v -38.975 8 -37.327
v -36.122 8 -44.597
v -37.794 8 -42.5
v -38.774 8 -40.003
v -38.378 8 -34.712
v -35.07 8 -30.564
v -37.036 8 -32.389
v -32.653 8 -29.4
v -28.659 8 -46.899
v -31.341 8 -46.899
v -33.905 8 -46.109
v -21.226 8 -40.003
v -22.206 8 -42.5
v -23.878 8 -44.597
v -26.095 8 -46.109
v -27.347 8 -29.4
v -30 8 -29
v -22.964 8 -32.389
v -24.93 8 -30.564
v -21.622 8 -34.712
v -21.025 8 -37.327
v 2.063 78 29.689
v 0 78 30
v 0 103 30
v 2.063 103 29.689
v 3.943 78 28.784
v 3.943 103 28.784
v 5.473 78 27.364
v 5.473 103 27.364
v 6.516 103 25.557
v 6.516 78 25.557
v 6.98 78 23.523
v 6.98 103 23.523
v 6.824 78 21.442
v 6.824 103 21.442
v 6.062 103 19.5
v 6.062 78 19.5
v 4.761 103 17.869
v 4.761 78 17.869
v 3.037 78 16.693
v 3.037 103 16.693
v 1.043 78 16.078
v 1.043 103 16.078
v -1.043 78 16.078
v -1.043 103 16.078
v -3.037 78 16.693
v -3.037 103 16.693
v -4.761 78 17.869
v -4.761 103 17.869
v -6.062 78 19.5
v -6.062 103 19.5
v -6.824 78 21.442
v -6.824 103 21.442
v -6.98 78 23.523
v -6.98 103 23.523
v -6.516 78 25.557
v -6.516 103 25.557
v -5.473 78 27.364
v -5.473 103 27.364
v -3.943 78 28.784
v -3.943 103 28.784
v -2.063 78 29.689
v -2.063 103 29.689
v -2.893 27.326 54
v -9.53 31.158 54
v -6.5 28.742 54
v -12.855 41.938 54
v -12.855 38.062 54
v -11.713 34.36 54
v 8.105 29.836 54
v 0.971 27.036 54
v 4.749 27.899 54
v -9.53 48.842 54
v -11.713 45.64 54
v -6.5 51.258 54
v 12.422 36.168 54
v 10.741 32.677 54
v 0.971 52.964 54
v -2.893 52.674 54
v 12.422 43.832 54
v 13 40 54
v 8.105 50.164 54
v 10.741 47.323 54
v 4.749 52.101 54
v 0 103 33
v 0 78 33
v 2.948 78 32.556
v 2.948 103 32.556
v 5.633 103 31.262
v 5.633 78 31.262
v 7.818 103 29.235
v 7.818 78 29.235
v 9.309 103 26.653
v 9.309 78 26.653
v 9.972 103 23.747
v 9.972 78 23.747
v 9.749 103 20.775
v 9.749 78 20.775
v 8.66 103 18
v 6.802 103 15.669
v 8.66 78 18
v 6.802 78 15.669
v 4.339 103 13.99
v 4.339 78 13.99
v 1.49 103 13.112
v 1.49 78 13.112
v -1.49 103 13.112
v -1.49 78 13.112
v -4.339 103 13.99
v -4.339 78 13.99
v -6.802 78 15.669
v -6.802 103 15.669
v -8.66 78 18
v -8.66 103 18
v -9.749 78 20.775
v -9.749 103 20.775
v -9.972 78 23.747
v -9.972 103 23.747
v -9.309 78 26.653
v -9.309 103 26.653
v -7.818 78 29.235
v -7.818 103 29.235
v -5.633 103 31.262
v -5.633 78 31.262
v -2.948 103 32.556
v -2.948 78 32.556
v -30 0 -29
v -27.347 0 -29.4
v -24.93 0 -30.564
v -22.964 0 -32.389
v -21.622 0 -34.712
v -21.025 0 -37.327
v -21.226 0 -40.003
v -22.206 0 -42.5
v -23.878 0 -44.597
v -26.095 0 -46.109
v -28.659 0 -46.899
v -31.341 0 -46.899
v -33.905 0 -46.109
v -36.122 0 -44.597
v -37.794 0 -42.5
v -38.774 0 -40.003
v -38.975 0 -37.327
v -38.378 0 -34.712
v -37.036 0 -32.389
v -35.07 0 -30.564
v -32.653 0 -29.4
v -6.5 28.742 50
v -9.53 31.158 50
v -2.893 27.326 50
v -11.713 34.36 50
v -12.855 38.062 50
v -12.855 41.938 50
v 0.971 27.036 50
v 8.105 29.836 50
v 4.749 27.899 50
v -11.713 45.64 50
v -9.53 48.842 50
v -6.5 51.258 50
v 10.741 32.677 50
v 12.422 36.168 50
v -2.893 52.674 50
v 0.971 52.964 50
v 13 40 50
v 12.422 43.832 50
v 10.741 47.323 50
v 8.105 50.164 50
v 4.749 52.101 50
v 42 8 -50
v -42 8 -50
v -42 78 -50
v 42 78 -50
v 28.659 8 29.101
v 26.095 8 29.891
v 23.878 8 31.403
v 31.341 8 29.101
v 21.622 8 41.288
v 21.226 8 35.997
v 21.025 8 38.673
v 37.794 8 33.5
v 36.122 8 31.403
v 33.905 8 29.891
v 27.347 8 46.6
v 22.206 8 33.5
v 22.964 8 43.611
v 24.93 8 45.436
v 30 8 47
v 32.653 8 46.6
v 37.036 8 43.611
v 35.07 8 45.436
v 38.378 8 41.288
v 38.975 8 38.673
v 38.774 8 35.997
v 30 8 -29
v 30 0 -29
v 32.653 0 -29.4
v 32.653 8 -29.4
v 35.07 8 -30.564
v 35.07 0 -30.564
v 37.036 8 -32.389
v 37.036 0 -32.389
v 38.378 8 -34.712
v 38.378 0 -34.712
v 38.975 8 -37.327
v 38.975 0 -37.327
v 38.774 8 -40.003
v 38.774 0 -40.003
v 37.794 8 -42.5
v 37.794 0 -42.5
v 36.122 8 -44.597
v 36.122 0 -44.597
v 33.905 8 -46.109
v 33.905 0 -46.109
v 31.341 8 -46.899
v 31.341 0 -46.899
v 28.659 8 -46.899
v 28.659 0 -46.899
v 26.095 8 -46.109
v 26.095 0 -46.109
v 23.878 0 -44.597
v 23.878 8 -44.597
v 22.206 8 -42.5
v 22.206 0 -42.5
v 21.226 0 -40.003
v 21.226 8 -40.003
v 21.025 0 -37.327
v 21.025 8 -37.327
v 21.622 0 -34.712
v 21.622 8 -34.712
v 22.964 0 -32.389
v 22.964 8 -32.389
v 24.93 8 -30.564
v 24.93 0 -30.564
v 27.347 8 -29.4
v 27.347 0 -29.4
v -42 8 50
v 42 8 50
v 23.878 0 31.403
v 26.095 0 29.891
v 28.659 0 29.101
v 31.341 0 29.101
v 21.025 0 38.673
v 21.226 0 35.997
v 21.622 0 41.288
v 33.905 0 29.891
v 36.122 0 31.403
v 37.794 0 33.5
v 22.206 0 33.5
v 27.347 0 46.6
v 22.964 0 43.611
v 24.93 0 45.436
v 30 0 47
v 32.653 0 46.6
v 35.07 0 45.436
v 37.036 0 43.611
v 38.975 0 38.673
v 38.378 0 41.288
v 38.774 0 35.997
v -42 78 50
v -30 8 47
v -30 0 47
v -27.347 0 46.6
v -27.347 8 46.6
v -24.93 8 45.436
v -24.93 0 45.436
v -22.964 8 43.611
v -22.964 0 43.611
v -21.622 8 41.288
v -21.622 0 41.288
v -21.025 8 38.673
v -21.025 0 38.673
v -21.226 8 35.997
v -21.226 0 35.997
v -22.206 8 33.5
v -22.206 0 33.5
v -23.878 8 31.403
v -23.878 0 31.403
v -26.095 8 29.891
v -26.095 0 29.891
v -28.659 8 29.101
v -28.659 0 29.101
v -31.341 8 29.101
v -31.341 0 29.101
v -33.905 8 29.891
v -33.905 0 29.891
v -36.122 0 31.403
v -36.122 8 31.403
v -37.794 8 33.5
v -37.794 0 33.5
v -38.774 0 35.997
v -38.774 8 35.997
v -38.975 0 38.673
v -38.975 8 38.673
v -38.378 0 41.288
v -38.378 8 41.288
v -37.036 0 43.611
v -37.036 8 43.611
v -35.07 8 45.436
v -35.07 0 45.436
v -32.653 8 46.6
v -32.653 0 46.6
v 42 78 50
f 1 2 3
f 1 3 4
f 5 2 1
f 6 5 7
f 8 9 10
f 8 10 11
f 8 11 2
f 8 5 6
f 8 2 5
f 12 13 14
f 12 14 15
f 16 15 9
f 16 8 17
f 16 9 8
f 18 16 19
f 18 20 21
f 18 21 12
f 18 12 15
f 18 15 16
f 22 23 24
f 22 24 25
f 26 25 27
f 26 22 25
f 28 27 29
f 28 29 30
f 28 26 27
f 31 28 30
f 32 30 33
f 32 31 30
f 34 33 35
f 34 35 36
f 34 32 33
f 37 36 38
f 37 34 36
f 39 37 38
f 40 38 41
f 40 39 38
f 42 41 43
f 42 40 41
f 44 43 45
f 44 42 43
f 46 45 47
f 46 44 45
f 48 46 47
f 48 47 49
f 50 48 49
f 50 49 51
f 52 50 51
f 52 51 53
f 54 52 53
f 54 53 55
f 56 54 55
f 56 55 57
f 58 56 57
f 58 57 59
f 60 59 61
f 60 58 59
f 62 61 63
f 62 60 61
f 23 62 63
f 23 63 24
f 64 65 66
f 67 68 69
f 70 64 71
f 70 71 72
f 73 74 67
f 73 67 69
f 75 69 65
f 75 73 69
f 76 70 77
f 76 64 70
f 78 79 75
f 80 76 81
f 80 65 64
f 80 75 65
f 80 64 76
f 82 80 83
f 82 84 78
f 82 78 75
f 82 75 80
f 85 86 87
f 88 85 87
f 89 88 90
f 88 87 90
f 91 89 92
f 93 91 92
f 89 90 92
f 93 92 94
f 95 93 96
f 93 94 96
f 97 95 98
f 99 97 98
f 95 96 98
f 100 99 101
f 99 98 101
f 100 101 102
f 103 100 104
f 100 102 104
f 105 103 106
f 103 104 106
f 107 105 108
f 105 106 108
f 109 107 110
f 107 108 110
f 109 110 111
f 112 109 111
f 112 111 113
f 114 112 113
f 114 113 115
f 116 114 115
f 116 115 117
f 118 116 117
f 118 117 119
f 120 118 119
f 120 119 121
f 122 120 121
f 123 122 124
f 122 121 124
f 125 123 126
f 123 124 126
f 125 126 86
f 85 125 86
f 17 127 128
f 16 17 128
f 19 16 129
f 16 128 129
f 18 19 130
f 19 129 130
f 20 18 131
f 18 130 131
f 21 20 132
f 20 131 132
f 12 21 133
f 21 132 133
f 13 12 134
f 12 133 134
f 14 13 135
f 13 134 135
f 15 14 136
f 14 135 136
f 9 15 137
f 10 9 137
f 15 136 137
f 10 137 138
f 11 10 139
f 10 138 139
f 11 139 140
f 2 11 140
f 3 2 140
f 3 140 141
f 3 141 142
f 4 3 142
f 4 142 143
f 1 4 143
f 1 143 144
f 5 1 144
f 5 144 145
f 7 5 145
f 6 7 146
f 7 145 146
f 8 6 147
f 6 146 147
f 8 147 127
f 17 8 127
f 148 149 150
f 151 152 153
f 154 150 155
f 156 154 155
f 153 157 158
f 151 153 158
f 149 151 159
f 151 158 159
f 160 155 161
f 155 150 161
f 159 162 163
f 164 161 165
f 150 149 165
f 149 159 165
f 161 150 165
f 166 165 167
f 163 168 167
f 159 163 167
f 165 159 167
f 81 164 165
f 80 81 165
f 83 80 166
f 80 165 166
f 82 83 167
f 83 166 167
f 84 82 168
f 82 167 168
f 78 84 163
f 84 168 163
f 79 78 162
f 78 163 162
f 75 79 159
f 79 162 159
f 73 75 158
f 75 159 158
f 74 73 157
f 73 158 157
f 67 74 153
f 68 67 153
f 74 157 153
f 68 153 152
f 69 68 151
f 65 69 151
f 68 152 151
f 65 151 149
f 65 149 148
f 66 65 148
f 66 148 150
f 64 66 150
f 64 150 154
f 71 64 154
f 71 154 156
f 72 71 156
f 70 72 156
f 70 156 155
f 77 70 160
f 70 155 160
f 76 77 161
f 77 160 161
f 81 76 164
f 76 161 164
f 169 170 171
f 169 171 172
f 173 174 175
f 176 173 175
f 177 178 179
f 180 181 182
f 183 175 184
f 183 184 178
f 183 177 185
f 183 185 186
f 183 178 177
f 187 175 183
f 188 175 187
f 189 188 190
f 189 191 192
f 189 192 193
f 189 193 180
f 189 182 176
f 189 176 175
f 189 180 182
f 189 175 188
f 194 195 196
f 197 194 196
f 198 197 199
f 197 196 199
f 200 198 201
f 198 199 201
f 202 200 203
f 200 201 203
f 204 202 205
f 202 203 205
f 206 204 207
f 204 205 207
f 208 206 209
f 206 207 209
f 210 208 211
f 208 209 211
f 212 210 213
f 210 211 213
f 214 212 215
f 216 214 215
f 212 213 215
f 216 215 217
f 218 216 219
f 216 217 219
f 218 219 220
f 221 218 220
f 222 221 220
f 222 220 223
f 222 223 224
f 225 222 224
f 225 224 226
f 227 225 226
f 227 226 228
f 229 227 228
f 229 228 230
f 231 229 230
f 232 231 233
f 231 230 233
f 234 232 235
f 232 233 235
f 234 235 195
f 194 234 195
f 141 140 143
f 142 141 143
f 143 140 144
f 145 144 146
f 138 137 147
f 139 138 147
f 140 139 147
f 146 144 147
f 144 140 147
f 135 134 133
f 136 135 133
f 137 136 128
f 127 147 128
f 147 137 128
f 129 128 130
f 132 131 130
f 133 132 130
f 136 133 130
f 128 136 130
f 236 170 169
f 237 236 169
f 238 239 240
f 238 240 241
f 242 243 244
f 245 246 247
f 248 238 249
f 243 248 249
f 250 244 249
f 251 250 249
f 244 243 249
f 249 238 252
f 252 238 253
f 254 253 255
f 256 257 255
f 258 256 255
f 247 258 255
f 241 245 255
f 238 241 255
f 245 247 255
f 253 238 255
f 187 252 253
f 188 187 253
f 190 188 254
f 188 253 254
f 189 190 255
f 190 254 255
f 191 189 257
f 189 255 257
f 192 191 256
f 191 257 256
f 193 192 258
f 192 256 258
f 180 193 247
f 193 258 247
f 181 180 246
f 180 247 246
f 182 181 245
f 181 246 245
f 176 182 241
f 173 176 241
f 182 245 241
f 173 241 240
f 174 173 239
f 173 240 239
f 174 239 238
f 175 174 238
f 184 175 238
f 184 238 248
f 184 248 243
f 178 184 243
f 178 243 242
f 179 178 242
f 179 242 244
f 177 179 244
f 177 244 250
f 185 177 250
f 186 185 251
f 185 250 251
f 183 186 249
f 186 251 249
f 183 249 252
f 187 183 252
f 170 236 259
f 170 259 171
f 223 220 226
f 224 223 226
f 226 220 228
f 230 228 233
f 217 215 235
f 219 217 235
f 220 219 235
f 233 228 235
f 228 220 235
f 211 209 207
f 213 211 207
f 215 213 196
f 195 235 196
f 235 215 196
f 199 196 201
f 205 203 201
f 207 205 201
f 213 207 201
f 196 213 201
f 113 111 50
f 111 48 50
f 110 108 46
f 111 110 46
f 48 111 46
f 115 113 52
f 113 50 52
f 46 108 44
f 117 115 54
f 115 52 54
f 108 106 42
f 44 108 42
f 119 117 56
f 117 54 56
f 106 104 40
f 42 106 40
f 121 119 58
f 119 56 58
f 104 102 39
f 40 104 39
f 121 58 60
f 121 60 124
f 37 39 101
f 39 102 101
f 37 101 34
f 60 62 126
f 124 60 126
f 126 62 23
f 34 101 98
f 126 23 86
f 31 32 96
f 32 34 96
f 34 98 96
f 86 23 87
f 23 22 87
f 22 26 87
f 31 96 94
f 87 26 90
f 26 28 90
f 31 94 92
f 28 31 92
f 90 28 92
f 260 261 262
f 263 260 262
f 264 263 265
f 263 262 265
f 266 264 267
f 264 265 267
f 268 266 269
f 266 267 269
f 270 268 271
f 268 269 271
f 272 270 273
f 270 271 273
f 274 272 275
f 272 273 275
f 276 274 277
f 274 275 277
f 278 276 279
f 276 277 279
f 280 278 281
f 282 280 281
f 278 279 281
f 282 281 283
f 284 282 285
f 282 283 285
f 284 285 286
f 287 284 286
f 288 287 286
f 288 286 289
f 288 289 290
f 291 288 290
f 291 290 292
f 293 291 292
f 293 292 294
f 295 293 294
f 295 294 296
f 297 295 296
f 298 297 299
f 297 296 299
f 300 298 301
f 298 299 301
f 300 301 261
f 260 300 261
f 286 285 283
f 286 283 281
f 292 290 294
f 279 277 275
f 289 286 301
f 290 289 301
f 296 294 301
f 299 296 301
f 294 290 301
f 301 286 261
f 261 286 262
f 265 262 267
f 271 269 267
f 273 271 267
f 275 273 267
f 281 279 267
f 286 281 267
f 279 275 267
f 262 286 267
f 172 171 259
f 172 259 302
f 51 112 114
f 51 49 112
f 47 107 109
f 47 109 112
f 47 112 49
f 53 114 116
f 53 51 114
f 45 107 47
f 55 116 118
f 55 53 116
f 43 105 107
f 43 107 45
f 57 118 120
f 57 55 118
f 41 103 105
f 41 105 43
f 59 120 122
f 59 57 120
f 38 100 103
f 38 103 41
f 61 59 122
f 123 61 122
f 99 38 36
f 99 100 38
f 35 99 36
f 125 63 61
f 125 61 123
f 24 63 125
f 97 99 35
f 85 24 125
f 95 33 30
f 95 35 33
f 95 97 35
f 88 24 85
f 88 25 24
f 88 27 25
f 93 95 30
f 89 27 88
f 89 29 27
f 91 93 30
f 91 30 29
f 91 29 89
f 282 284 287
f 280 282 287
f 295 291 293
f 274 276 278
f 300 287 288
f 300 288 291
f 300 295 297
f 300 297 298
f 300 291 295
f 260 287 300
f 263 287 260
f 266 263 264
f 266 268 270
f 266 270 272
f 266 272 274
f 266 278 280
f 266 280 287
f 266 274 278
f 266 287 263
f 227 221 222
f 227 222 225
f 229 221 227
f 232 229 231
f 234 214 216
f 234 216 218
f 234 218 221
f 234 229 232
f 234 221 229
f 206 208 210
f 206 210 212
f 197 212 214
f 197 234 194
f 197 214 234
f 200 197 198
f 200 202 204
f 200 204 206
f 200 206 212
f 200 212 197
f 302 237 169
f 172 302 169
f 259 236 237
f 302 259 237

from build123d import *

# Parameters (mm, degrees)
LISTING_ENVELOPE_100X84X78_START     = 8
SKETCH1_W                            = 84
SKETCH1_H                            = 100
LISTING_ENVELOPE_100X84X78_DEPTH     = 70
SKETCH2_R                            = 9
SUCTION_FOOT_ASSUMED_DEPTH           = 8
SKETCH3_R                            = 9
BOSS_EXTRUDE3_DEPTH                  = 8
SKETCH4_R                            = 9
BOSS_EXTRUDE4_DEPTH                  = 8
SKETCH5_R                            = 9
BOSS_EXTRUDE5_DEPTH                  = 8
NOZZLE_EXTRA_CLEARANCE_ASSUMED_START = 78
SKETCH6_R                            = 10
SKETCH6_R_2                          = 7
NOZZLE_EXTRA_CLEARANCE_ASSUMED_DEPTH = 25
FLOW_ADJUSTMENT_KNOB_ASSUMED_START   = 50
SKETCH7_R                            = 13
FLOW_ADJUSTMENT_KNOB_ASSUMED_DEPTH   = 4


with BuildPart() as part:
    # Sketch1 → Listing_envelope_100x84x78 (new body)
    with BuildSketch(Plane(origin=(0, 0, 0), x_dir=(1, 0, 0), z_dir=(0, 1, 0)).offset(LISTING_ENVELOPE_100X84X78_START)):
        Rectangle(SKETCH1_W, SKETCH1_H)
    extrude(amount=LISTING_ENVELOPE_100X84X78_DEPTH)


with BuildPart() as body_2:
    # Sketch2 → Suction_foot_ASSUMED (new body)
    with BuildSketch(Plane(origin=(0, 0, 0), x_dir=(1, 0, 0), z_dir=(0, 1, 0))):
        with Locations(Location((-30, -38, 0), (0, 0, 270))):
            Circle(SKETCH2_R)
    extrude(amount=SUCTION_FOOT_ASSUMED_DEPTH)


with BuildPart() as body_3:
    # Sketch3 → Boss-Extrude3 (new body)
    with BuildSketch(Plane(origin=(0, 0, 0), x_dir=(1, 0, 0), z_dir=(0, 1, 0))):
        with Locations(Location((-30, 38, 0), (0, 0, 270))):
            Circle(SKETCH3_R)
    extrude(amount=BOSS_EXTRUDE3_DEPTH)


with BuildPart() as body_4:
    # Sketch4 → Boss-Extrude4 (new body)
    with BuildSketch(Plane(origin=(0, 0, 0), x_dir=(1, 0, 0), z_dir=(0, 1, 0))):
        with Locations(Location((30, -38, 0), (0, 0, 270))):
            Circle(SKETCH4_R)
    extrude(amount=BOSS_EXTRUDE4_DEPTH)


with BuildPart() as body_5:
    # Sketch5 → Boss-Extrude5 (new body)
    with BuildSketch(Plane(origin=(0, 0, 0), x_dir=(1, 0, 0), z_dir=(0, 1, 0))):
        with Locations(Location((30, 38, 0), (0, 0, 270))):
            Circle(SKETCH5_R)
    extrude(amount=BOSS_EXTRUDE5_DEPTH)


with BuildPart() as body_6:
    # Sketch6 → Nozzle_extra_clearance_ASSUMED (new body)
    with BuildSketch(Plane(origin=(0, 0, 0), x_dir=(1, 0, 0), z_dir=(0, 1, 0)).offset(NOZZLE_EXTRA_CLEARANCE_ASSUMED_START)):
        with Locations(Location((0, -23, 0), (0, 0, 270))):
            Circle(SKETCH6_R)
        with Locations(Location((0, -23, 0), (0, 0, 270))):
            Circle(SKETCH6_R_2, mode=Mode.SUBTRACT)
    extrude(amount=NOZZLE_EXTRA_CLEARANCE_ASSUMED_DEPTH)


with BuildPart() as body_7:
    # Sketch7 → Flow_adjustment_knob_ASSUMED (new body)
    with BuildSketch(Plane.XY.offset(FLOW_ADJUSTMENT_KNOB_ASSUMED_START)):
        with Locations((0, 40)):
            Circle(SKETCH7_R)
    extrude(amount=FLOW_ADJUSTMENT_KNOB_ASSUMED_DEPTH)


solid = Compound([part.part, body_2.part, body_3.part, body_4.part, body_5.part, body_6.part, body_7.part])
